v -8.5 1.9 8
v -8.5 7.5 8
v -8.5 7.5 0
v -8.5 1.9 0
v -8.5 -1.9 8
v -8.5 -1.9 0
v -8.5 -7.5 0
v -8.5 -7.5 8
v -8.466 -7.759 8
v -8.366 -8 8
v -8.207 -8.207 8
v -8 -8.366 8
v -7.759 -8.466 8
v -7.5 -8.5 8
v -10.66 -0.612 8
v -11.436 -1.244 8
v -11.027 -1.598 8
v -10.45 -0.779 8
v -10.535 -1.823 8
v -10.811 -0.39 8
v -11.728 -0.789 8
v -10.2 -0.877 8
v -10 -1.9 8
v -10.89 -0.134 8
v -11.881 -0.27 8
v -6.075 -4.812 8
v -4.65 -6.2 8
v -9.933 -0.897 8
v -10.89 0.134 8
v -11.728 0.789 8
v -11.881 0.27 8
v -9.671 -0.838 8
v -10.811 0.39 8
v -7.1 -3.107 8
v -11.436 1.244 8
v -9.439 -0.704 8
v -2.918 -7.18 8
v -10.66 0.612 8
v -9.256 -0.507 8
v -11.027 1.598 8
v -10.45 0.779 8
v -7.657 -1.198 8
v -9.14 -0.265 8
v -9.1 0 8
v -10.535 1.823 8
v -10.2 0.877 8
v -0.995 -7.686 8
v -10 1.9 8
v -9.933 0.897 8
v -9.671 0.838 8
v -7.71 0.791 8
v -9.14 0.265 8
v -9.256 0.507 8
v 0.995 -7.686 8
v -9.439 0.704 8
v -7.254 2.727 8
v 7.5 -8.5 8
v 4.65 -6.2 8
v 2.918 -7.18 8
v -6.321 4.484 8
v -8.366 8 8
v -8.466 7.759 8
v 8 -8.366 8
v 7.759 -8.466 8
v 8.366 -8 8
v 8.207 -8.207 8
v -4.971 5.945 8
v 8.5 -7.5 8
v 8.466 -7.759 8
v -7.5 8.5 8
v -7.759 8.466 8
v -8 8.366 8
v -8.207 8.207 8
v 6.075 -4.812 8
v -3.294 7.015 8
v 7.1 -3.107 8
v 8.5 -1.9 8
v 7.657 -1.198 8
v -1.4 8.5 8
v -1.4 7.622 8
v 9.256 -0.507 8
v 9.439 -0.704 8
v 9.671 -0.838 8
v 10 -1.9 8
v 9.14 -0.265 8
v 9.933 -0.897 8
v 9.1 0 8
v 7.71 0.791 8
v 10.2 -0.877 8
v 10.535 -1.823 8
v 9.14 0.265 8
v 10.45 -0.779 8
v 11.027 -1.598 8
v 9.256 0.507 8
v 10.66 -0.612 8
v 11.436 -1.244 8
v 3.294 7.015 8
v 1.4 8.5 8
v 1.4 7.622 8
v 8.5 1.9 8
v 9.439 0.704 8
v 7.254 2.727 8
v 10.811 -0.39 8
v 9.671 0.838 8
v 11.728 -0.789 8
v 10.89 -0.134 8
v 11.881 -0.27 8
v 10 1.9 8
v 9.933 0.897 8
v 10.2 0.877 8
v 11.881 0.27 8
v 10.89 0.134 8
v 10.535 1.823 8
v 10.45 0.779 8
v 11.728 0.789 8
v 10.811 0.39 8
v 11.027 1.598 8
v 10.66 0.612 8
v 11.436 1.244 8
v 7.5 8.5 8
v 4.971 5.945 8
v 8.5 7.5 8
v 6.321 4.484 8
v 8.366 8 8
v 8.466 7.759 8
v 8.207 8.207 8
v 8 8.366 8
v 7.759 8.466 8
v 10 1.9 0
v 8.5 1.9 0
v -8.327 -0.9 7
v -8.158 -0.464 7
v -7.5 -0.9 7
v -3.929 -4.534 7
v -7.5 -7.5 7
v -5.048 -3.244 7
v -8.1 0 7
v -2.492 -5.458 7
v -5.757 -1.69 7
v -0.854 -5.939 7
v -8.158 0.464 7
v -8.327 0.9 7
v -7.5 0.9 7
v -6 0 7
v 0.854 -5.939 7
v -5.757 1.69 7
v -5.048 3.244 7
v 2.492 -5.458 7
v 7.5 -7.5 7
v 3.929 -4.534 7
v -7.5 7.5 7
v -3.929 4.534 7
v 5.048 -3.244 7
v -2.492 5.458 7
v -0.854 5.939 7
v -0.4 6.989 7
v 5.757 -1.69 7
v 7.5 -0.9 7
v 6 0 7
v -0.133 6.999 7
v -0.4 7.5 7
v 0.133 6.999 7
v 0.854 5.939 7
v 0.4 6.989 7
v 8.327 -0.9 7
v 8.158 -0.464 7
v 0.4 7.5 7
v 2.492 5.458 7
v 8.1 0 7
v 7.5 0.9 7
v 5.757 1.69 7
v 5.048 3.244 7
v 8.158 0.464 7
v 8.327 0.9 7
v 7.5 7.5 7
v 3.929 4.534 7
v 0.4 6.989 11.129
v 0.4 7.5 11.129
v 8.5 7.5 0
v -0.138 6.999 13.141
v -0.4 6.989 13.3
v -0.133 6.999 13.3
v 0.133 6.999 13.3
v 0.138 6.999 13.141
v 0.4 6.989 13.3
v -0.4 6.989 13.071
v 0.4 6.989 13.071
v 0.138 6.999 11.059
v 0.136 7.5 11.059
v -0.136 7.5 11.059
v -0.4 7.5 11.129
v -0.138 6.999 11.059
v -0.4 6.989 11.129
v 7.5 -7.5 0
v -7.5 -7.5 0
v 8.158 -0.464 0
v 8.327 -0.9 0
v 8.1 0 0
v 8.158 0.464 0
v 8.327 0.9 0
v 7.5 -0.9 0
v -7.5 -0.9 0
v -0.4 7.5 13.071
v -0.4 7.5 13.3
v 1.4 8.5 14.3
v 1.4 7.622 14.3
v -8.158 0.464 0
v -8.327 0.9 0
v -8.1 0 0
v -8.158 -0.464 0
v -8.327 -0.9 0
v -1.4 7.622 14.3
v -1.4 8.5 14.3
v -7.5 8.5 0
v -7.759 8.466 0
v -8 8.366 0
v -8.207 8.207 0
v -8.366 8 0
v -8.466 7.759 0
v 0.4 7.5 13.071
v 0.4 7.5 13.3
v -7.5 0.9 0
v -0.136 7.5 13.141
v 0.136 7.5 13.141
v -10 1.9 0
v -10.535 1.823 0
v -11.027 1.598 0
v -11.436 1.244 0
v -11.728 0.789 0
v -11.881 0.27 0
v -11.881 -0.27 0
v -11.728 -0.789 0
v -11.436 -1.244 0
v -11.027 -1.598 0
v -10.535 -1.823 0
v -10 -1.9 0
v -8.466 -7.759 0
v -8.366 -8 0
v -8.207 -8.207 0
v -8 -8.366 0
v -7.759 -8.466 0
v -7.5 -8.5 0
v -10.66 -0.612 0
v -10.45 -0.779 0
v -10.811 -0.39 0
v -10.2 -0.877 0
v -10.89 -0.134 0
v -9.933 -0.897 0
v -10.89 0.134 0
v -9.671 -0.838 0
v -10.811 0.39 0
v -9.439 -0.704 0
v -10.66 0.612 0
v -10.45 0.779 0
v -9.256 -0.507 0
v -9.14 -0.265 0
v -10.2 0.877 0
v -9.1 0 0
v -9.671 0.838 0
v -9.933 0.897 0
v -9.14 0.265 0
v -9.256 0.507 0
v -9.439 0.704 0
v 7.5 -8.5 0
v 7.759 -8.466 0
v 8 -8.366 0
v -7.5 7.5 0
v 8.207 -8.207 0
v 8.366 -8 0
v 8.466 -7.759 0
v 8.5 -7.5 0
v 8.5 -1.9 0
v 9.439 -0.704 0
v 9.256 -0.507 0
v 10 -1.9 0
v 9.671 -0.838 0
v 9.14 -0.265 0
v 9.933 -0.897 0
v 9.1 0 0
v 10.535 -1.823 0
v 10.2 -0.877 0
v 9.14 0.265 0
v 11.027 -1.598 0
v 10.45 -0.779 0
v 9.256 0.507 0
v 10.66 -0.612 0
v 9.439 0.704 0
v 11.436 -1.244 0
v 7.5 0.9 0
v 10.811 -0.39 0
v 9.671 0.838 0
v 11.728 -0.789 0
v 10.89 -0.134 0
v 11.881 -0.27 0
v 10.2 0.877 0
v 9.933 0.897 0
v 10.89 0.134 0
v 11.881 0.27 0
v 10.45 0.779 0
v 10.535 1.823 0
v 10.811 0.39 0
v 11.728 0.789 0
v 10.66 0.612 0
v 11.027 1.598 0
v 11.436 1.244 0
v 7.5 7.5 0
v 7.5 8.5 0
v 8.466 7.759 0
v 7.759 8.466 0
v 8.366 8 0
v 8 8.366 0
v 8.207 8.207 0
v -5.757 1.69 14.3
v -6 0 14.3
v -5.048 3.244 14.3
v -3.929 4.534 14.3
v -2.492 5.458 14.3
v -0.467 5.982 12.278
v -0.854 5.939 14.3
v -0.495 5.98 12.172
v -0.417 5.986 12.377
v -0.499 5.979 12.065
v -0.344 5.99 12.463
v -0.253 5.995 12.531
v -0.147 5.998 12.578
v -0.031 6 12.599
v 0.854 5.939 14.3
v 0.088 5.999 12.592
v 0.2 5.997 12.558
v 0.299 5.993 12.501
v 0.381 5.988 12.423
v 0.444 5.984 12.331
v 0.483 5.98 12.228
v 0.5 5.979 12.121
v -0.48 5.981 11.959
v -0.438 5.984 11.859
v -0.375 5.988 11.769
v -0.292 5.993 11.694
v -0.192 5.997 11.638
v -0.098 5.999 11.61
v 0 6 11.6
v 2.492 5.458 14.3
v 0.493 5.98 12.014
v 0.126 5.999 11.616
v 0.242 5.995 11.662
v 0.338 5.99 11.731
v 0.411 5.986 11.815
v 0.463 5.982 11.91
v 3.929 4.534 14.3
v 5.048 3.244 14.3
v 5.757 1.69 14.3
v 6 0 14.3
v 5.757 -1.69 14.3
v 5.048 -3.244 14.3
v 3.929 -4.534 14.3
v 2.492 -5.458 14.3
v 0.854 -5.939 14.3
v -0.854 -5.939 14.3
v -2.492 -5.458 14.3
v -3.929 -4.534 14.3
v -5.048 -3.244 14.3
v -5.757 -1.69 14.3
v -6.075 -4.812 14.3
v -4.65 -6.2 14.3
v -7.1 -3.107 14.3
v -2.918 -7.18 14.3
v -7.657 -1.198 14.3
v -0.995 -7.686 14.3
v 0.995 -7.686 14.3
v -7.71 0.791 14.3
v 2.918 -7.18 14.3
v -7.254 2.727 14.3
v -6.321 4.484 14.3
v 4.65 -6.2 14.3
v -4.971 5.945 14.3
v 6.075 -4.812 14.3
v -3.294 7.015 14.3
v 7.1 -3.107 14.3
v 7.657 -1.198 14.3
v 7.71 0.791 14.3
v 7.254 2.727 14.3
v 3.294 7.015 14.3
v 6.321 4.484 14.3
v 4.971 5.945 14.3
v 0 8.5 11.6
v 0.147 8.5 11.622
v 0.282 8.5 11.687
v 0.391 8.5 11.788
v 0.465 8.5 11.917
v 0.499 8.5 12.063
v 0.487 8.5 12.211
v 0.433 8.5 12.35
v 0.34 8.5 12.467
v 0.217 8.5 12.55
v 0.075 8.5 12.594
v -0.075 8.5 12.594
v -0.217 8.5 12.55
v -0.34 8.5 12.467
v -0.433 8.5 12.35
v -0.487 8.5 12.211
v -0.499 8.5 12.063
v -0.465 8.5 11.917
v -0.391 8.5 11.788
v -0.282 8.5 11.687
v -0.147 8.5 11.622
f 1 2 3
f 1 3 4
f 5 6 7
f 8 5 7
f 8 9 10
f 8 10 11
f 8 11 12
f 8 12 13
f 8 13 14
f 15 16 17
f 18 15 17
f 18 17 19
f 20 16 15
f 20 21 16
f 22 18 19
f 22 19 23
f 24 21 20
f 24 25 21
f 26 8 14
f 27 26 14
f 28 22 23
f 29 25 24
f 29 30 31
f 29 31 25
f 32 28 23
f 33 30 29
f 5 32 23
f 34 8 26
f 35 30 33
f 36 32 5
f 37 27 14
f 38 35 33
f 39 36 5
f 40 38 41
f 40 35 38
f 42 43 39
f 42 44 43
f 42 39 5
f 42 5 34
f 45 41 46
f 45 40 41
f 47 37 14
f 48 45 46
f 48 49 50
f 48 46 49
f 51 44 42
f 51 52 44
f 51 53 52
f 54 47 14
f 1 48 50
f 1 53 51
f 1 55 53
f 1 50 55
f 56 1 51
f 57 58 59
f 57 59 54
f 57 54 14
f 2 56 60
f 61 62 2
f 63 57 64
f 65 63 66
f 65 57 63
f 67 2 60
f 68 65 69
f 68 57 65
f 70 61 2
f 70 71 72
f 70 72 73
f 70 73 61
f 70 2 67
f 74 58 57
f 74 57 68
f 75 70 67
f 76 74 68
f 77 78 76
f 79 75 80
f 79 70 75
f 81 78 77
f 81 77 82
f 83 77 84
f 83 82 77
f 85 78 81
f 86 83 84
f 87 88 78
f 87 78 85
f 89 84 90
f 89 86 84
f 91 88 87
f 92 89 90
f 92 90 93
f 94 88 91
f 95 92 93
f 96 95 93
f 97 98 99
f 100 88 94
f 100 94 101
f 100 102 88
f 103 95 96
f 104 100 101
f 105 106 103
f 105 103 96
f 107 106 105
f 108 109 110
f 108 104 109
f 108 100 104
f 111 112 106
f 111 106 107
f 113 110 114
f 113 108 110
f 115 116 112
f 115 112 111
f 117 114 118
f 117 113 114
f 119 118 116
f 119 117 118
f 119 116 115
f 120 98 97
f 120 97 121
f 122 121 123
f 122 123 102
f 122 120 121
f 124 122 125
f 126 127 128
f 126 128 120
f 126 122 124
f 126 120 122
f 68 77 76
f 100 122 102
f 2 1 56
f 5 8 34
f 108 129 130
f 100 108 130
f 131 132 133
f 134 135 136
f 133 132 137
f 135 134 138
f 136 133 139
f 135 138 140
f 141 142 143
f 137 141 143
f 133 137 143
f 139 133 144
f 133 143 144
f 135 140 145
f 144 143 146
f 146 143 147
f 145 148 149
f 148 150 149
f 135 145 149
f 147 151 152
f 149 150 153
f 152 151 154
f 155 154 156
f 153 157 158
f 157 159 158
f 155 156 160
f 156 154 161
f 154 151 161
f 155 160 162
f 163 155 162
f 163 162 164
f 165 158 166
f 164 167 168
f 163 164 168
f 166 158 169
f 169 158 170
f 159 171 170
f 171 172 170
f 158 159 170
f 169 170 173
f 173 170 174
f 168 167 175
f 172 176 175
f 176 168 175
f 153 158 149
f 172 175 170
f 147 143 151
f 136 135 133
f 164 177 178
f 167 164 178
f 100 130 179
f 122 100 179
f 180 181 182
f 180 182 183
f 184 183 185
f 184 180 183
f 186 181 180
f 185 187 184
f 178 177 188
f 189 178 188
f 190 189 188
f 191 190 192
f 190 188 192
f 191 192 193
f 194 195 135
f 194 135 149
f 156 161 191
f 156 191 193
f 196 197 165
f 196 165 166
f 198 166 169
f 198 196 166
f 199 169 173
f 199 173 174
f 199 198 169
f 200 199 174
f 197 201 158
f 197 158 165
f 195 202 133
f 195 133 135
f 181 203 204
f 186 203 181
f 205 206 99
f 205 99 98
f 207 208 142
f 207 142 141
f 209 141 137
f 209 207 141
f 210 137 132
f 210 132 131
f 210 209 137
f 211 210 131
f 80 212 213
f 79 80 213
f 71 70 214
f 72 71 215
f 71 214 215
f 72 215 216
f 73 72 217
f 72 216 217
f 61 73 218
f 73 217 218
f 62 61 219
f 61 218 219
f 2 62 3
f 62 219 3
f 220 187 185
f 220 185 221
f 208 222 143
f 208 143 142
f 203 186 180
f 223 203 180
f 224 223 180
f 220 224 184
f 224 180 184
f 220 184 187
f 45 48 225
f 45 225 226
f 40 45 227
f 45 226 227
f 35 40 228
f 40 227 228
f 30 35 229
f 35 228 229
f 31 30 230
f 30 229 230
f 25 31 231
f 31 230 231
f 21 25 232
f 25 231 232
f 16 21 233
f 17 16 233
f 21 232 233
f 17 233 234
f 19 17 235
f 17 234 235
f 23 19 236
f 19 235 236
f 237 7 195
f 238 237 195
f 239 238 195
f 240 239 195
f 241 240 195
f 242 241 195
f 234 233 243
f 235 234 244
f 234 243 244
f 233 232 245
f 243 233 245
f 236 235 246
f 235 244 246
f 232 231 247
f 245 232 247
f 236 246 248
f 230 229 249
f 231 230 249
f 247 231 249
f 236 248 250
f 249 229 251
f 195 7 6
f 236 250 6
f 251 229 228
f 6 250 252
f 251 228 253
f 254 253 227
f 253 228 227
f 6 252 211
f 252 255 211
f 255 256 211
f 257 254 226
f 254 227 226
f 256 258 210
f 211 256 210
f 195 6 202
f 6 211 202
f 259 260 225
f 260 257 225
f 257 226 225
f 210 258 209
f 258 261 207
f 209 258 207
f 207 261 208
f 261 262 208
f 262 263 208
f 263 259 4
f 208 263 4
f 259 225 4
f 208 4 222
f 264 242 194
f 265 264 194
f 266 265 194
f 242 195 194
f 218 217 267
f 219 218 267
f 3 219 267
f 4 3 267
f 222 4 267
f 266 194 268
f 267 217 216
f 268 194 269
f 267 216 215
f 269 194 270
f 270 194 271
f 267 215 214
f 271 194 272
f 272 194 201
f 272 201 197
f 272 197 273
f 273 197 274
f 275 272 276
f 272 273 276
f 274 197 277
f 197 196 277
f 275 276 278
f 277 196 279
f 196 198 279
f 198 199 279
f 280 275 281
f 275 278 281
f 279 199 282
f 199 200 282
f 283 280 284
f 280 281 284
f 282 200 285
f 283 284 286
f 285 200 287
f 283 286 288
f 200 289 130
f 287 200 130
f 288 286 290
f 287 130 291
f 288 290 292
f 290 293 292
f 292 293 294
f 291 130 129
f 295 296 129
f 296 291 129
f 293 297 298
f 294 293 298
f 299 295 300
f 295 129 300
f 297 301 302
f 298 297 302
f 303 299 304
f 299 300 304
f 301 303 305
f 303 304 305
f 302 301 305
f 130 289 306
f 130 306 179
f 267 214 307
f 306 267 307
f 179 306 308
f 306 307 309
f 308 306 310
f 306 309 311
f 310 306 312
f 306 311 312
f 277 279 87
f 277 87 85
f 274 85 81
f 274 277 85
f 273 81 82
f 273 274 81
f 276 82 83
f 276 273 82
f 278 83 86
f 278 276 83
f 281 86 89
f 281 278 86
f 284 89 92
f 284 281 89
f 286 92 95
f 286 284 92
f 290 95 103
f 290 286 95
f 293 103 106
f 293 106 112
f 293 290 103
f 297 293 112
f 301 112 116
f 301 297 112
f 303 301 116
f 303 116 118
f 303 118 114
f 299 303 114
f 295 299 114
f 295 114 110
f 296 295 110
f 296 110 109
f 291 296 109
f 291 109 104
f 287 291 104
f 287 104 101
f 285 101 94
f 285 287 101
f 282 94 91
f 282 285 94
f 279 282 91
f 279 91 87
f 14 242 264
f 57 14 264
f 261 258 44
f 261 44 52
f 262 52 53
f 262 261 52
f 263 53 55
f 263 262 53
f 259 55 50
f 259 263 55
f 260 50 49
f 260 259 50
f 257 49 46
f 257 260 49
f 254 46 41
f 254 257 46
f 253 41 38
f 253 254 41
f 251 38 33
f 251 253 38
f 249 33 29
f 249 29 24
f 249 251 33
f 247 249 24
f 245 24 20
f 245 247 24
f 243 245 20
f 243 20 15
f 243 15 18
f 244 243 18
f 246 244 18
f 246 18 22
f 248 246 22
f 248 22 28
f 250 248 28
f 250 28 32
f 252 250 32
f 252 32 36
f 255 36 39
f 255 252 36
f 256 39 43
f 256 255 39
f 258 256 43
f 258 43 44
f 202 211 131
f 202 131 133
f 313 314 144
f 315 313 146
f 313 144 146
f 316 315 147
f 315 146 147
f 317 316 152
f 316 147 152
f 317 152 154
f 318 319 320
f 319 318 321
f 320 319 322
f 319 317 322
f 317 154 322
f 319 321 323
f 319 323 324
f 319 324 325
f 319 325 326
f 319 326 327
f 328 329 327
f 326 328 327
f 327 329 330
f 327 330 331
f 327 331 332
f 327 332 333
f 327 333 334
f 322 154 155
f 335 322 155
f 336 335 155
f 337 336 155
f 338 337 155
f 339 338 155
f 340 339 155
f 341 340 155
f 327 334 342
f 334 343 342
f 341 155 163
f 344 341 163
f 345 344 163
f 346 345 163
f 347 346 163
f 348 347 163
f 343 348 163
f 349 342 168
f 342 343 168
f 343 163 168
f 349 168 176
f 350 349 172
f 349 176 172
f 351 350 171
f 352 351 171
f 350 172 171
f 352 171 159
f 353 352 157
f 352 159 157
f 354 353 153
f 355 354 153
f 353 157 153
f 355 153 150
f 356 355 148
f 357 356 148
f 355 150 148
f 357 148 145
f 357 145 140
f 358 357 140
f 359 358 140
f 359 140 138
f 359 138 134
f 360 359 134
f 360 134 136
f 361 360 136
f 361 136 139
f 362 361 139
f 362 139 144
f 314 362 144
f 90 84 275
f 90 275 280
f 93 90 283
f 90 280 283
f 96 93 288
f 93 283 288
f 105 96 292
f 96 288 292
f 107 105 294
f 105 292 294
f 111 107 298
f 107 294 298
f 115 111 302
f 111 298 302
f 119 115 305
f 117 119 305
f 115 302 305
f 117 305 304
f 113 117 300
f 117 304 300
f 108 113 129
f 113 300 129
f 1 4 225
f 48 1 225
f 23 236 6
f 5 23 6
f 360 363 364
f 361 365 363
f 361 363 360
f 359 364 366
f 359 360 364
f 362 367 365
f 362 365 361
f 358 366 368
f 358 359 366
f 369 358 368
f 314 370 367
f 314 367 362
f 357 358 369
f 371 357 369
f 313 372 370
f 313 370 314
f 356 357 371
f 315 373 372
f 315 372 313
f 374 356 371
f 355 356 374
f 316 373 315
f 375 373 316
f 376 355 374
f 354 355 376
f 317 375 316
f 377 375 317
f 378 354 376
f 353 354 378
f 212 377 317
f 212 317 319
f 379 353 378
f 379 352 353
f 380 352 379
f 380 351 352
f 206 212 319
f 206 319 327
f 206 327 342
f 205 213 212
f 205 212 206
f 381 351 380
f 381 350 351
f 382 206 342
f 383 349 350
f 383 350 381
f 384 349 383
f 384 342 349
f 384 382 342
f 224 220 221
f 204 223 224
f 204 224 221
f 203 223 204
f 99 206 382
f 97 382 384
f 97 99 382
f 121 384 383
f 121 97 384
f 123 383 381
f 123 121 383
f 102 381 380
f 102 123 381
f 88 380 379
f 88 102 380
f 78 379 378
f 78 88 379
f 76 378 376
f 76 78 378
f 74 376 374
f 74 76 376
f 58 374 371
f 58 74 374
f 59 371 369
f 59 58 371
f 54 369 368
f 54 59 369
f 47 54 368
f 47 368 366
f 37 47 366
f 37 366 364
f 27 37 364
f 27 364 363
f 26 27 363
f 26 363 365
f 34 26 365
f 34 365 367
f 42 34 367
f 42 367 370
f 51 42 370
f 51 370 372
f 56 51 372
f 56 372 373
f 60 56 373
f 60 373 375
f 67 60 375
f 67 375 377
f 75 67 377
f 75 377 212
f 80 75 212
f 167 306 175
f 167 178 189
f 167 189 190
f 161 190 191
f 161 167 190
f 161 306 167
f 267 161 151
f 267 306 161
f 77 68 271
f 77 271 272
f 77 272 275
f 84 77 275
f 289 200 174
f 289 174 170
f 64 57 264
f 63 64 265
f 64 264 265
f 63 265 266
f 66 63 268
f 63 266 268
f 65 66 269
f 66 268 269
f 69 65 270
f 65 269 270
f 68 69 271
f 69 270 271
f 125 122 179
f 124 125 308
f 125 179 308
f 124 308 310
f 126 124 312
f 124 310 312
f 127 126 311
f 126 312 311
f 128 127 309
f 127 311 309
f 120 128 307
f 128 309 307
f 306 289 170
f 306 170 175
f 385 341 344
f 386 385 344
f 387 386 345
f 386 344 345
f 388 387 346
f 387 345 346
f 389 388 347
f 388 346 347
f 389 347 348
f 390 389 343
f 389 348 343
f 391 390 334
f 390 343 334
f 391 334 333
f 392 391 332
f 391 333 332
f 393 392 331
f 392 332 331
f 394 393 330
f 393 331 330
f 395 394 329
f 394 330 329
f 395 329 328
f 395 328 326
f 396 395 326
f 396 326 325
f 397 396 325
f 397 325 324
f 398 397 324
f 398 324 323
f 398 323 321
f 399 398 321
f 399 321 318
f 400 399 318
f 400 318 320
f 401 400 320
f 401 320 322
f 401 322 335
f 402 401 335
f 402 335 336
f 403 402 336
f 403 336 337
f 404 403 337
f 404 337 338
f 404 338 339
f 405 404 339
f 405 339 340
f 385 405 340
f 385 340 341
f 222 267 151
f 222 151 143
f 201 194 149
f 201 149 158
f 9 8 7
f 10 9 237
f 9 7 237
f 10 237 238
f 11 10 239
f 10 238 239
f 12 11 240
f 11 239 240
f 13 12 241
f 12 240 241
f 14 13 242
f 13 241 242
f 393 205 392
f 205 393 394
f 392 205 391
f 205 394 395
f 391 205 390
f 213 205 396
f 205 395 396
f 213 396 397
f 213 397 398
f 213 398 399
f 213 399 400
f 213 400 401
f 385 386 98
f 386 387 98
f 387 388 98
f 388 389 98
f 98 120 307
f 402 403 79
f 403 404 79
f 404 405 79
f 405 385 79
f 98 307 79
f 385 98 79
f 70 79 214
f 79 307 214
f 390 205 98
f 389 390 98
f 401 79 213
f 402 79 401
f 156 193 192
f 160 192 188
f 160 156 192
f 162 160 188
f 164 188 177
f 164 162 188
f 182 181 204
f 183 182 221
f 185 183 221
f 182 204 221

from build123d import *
from OCP.BRepAlgoAPI import BRepAlgoAPI_Cut
from OCP.TopTools import TopTools_ListOfShape

# Parameters (mm, degrees)
SKETCH1_R                 = 0.9
BOSS_EXTRUDE1_DEPTH       = 8
SKETCH2_R                 = 7.75
SKETCH2_R_2               = 6
BOSS_EXTRUDE2_DEPTH       = 6.3
BOSS_EXTRUDE3_REACH       = 22.454
SKETCH4_W                 = 2.8
SKETCH4_H                 = 0.87750041
CUT_EXTRUDE1_REACH        = 27.201
CUT_EXTRUDE1_END_RADIUS   = 6
SKETCH3_R                 = 0.05
SHELL1_DEPTH              = 7
SHELL1_START              = 7
SHELL1_2_DEPTH            = 4.129175608
SHELL1_START_2            = 13.07082292
SHELL1_3_DEPTH            = 0.22917708
SHELL1_START_3            = 6.988561285
SHELL1_4_DEPTH            = 0.511438715
SKETCH2_2_R               = 6
CUT_EXTRUDE2_DEPTH        = 17.669133202
F_1_0MM_DOWEL_HOLE1_D     = 1
F_1_0MM_DOWEL_HOLE1_DEPTH = 3
F_1_0MM_DOWEL_HOLE1_TIP   = 0.30043031


with BuildPart() as part:
    # Sketch1 → Boss-Extrude1 (new body)
    with BuildSketch(Plane.XY):
        with BuildLine():
            Line((-7.5, -8.5), (7.5, -8.5))
            ThreePointArc((7.5, -8.5), (8.207106781, -8.207106781), (8.5, -7.5))
            Line((8.5, -7.5), (8.5, -1.9))
            Line((8.5, -1.9), (10, -1.9))
            ThreePointArc((10, -1.9), (11.9, 0), (10, 1.9))
            Line((10, 1.9), (8.5, 1.9))
            Line((8.5, 1.9), (8.5, 7.5))
            ThreePointArc((8.5, 7.5), (8.207106781, 8.207106781), (7.5, 8.5))
            Line((7.5, 8.5), (-7.5, 8.5))
            ThreePointArc((-7.5, 8.5), (-8.207106781, 8.207106781), (-8.5, 7.5))
            Line((-8.5, 7.5), (-8.5, 1.9))
            Line((-8.5, 1.9), (-10, 1.9))
            ThreePointArc((-10, 1.9), (-11.9, 0), (-10, -1.9))
            Line((-10, -1.9), (-8.5, -1.9))
            Line((-8.5, -1.9), (-8.5, -7.5))
            ThreePointArc((-8.5, -7.5), (-8.207106781, -8.207106781), (-7.5, -8.5))
        make_face()
        with Locations((-10, 0)):
            Circle(SKETCH1_R, mode=Mode.SUBTRACT)
        with Locations(Location((10, 0, 0), (0, 0, 180))):
            Circle(SKETCH1_R, mode=Mode.SUBTRACT)
    extrude(amount=BOSS_EXTRUDE1_DEPTH)

    # Sketch2 → Boss-Extrude2 (add)
    with BuildSketch(Plane(origin=(0, 0, 8), x_dir=(-1, 0, 0), z_dir=(0, 0, -1))):
        Circle(SKETCH2_R)
        Circle(SKETCH2_R_2, mode=Mode.SUBTRACT)
    extrude(amount=-BOSS_EXTRUDE2_DEPTH)

    # Sketch4 → Boss-Extrude3 (add, up to next)
    with BuildSketch(Plane.XY.offset(14.3), mode=Mode.PRIVATE) as boss_extrude3_sk1:
        with Locations((0, 8.061249795)):
            Rectangle(SKETCH4_W, SKETCH4_H)
    boss_extrude3_tool1 = extrude(boss_extrude3_sk1.sketch, amount=-BOSS_EXTRUDE3_REACH, mode=Mode.PRIVATE) - part.part
    add(boss_extrude3_tool1.solids().sort_by_distance((0, 8.06125, 14.3))[0])

    # Cut-Extrude1: up to this cylinder (the profile starts outside it)
    cut_extrude1_end = Plane(origin=(0, 0, 12.1), z_dir=(0, 0, -1)) * Cylinder(CUT_EXTRUDE1_END_RADIUS, 67.402, mode=Mode.PRIVATE)
    # Sketch3 → Cut-Extrude1 (cut, up to the surface)
    with BuildSketch(Plane(origin=(0, 8.5, 0), x_dir=(-1, 0, 0), z_dir=(0, 1, 0)), mode=Mode.PRIVATE) as cut_extrude1_sk1:
        with Locations(Location((0, 12.1, 0), (0, 0, 90))):
            Circle(SKETCH3_R)
    cut_extrude1_tool1 = extrude(cut_extrude1_sk1.sketch, amount=-CUT_EXTRUDE1_REACH, mode=Mode.PRIVATE) - cut_extrude1_end
    add(cut_extrude1_tool1.solids().sort_by_distance((0, 8.5, 12.1))[0], mode=Mode.SUBTRACT)


with BuildPart() as shell1_tool:
    # Shell1: read off the stored shape, not the designer's step
    # Shell1 outline → Shell1 (new body)
    with BuildSketch(Plane.XY):
        with BuildLine():
            Line((7.5, -0.9), (8.326679947, -0.9))
            ThreePointArc((8.326679947, -0.9), (8.1, 0), (8.326679947, 0.9))
            Line((8.326679947, 0.9), (7.5, 0.9))
            Line((7.5, 0.9), (7.5, 7.5))
            Line((7.5, 7.5), (-7.5, 7.5))
            Line((-7.5, 7.5), (-7.5, 0.9))
            Line((-7.5, 0.9), (-8.326679947, 0.9))
            ThreePointArc((-8.326679947, 0.9), (-8.1, 0), (-8.326679947, -0.9))
            Line((-8.326679947, -0.9), (-7.5, -0.9))
            Line((-7.5, -0.9), (-7.5, -7.5))
            Line((-7.5, -7.5), (7.5, -7.5))
            Line((7.5, -7.5), (7.5, -0.9))
        make_face()
    extrude(amount=SHELL1_DEPTH)


with BuildPart() as part_1:
    add(part.part)

    # Shell1: cut by shell1_tool, with a tolerance
    shell1_stock = TopTools_ListOfShape()
    shell1_stock.Append(part_1.part.wrapped)
    shell1_tools = TopTools_ListOfShape()
    shell1_tools.Append(shell1_tool.part.wrapped)
    shell1_cut = BRepAlgoAPI_Cut()
    shell1_cut.SetArguments(shell1_stock)
    shell1_cut.SetTools(shell1_tools)
    shell1_cut.SetFuzzyValue(0.00001)
    shell1_cut.Build()
    add(Compound.cast(shell1_cut.Shape()).solids(), mode=Mode.REPLACE)


with BuildPart() as shell1_2_tool:
    # Shell1 2 outline → Shell1 2 (new body)
    with BuildSketch(Plane.XY.offset(SHELL1_START)):
        with BuildLine():
            Line((0.4, 6.988562084), (0.4, 7.5))
            Line((0.4, 7.5), (-0.4, 7.5))
            Line((-0.4, 7.5), (-0.4, 6.988562084))
            ThreePointArc((-0.4, 6.988562084), (0, 7), (0.4, 6.988562084))
        make_face()
    extrude(amount=SHELL1_2_DEPTH)


with BuildPart() as part_2:
    add(part_1.part)

    # Shell1 2: cut by shell1_2_tool, with a tolerance
    shell1_2_stock = TopTools_ListOfShape()
    shell1_2_stock.Append(part_2.part.wrapped)
    shell1_2_tools = TopTools_ListOfShape()
    shell1_2_tools.Append(shell1_2_tool.part.wrapped)
    shell1_2_cut = BRepAlgoAPI_Cut()
    shell1_2_cut.SetArguments(shell1_2_stock)
    shell1_2_cut.SetTools(shell1_2_tools)
    shell1_2_cut.SetFuzzyValue(0.00001)
    shell1_2_cut.Build()
    add(Compound.cast(shell1_2_cut.Shape()).solids(), mode=Mode.REPLACE)


with BuildPart() as shell1_3_tool:
    # Shell1 3 outline → Shell1 3 (new body)
    with BuildSketch(Plane.XY.offset(SHELL1_START_2)):
        with BuildLine():
            Line((0.4, 6.988562084), (0.4, 7.5))
            Line((0.4, 7.5), (-0.4, 7.5))
            Line((-0.4, 7.5), (-0.4, 6.988562084))
            ThreePointArc((-0.4, 6.988562084), (0, 7), (0.4, 6.988562084))
        make_face()
    extrude(amount=SHELL1_3_DEPTH)


with BuildPart() as part_3:
    add(part_2.part)

    # Shell1 3: cut by shell1_3_tool, with a tolerance
    shell1_3_stock = TopTools_ListOfShape()
    shell1_3_stock.Append(part_3.part.wrapped)
    shell1_3_tools = TopTools_ListOfShape()
    shell1_3_tools.Append(shell1_3_tool.part.wrapped)
    shell1_3_cut = BRepAlgoAPI_Cut()
    shell1_3_cut.SetArguments(shell1_3_stock)
    shell1_3_cut.SetTools(shell1_3_tools)
    shell1_3_cut.SetFuzzyValue(0.00001)
    shell1_3_cut.Build()
    add(Compound.cast(shell1_3_cut.Shape()).solids(), mode=Mode.REPLACE)


with BuildPart() as shell1_4_tool:
    # Shell1 4 outline → Shell1 4 (new body)
    with BuildSketch(Plane(origin=(0, 0, 0), x_dir=(1, 0, 0), z_dir=(0, 1, 0)).offset(SHELL1_START_3)):
        with BuildLine():
            Line((-0.4, -11.129175608), (0.4, -11.129175608))
            ThreePointArc((0.4, -11.129175608), (0, -11.05), (-0.4, -11.129175608))
        make_face()
        with BuildLine():
            Line((0.4, -13.070824392), (-0.4, -13.070824392))
            ThreePointArc((-0.4, -13.070824392), (0, -13.15), (0.4, -13.070824392))
        make_face()
    extrude(amount=SHELL1_4_DEPTH)


with BuildPart() as part_4:
    add(part_3.part)


with BuildPart() as part_5:
    # Shell1 4: joined with shell1_4_tool
    add(part_4.part.fuse(shell1_4_tool.part, tol=0.00001))

    # Sketch2<2> → Cut-Extrude2 (cut, through all)
    with BuildSketch(Plane(origin=(0, 0, 8), x_dir=(-1, 0, 0), z_dir=(0, 0, -1))):
        Circle(SKETCH2_2_R)
    extrude(amount=CUT_EXTRUDE2_DEPTH, mode=Mode.SUBTRACT)

    # Ø1.0mm Dowel Hole1
    with Locations(Plane(origin=(0, 8.5, 12.1), x_dir=(0, 0, 1), z_dir=(0, 1, 0))):
        with Locations((0, 0)):
            Hole(F_1_0MM_DOWEL_HOLE1_D / 2, depth=F_1_0MM_DOWEL_HOLE1_DEPTH)
            with Locations((0, 0, -(F_1_0MM_DOWEL_HOLE1_DEPTH + F_1_0MM_DOWEL_HOLE1_TIP / 2))):  # 118° drill point
                Cone(0, F_1_0MM_DOWEL_HOLE1_D / 2, F_1_0MM_DOWEL_HOLE1_TIP, mode=Mode.SUBTRACT)


solid = part_5.part
